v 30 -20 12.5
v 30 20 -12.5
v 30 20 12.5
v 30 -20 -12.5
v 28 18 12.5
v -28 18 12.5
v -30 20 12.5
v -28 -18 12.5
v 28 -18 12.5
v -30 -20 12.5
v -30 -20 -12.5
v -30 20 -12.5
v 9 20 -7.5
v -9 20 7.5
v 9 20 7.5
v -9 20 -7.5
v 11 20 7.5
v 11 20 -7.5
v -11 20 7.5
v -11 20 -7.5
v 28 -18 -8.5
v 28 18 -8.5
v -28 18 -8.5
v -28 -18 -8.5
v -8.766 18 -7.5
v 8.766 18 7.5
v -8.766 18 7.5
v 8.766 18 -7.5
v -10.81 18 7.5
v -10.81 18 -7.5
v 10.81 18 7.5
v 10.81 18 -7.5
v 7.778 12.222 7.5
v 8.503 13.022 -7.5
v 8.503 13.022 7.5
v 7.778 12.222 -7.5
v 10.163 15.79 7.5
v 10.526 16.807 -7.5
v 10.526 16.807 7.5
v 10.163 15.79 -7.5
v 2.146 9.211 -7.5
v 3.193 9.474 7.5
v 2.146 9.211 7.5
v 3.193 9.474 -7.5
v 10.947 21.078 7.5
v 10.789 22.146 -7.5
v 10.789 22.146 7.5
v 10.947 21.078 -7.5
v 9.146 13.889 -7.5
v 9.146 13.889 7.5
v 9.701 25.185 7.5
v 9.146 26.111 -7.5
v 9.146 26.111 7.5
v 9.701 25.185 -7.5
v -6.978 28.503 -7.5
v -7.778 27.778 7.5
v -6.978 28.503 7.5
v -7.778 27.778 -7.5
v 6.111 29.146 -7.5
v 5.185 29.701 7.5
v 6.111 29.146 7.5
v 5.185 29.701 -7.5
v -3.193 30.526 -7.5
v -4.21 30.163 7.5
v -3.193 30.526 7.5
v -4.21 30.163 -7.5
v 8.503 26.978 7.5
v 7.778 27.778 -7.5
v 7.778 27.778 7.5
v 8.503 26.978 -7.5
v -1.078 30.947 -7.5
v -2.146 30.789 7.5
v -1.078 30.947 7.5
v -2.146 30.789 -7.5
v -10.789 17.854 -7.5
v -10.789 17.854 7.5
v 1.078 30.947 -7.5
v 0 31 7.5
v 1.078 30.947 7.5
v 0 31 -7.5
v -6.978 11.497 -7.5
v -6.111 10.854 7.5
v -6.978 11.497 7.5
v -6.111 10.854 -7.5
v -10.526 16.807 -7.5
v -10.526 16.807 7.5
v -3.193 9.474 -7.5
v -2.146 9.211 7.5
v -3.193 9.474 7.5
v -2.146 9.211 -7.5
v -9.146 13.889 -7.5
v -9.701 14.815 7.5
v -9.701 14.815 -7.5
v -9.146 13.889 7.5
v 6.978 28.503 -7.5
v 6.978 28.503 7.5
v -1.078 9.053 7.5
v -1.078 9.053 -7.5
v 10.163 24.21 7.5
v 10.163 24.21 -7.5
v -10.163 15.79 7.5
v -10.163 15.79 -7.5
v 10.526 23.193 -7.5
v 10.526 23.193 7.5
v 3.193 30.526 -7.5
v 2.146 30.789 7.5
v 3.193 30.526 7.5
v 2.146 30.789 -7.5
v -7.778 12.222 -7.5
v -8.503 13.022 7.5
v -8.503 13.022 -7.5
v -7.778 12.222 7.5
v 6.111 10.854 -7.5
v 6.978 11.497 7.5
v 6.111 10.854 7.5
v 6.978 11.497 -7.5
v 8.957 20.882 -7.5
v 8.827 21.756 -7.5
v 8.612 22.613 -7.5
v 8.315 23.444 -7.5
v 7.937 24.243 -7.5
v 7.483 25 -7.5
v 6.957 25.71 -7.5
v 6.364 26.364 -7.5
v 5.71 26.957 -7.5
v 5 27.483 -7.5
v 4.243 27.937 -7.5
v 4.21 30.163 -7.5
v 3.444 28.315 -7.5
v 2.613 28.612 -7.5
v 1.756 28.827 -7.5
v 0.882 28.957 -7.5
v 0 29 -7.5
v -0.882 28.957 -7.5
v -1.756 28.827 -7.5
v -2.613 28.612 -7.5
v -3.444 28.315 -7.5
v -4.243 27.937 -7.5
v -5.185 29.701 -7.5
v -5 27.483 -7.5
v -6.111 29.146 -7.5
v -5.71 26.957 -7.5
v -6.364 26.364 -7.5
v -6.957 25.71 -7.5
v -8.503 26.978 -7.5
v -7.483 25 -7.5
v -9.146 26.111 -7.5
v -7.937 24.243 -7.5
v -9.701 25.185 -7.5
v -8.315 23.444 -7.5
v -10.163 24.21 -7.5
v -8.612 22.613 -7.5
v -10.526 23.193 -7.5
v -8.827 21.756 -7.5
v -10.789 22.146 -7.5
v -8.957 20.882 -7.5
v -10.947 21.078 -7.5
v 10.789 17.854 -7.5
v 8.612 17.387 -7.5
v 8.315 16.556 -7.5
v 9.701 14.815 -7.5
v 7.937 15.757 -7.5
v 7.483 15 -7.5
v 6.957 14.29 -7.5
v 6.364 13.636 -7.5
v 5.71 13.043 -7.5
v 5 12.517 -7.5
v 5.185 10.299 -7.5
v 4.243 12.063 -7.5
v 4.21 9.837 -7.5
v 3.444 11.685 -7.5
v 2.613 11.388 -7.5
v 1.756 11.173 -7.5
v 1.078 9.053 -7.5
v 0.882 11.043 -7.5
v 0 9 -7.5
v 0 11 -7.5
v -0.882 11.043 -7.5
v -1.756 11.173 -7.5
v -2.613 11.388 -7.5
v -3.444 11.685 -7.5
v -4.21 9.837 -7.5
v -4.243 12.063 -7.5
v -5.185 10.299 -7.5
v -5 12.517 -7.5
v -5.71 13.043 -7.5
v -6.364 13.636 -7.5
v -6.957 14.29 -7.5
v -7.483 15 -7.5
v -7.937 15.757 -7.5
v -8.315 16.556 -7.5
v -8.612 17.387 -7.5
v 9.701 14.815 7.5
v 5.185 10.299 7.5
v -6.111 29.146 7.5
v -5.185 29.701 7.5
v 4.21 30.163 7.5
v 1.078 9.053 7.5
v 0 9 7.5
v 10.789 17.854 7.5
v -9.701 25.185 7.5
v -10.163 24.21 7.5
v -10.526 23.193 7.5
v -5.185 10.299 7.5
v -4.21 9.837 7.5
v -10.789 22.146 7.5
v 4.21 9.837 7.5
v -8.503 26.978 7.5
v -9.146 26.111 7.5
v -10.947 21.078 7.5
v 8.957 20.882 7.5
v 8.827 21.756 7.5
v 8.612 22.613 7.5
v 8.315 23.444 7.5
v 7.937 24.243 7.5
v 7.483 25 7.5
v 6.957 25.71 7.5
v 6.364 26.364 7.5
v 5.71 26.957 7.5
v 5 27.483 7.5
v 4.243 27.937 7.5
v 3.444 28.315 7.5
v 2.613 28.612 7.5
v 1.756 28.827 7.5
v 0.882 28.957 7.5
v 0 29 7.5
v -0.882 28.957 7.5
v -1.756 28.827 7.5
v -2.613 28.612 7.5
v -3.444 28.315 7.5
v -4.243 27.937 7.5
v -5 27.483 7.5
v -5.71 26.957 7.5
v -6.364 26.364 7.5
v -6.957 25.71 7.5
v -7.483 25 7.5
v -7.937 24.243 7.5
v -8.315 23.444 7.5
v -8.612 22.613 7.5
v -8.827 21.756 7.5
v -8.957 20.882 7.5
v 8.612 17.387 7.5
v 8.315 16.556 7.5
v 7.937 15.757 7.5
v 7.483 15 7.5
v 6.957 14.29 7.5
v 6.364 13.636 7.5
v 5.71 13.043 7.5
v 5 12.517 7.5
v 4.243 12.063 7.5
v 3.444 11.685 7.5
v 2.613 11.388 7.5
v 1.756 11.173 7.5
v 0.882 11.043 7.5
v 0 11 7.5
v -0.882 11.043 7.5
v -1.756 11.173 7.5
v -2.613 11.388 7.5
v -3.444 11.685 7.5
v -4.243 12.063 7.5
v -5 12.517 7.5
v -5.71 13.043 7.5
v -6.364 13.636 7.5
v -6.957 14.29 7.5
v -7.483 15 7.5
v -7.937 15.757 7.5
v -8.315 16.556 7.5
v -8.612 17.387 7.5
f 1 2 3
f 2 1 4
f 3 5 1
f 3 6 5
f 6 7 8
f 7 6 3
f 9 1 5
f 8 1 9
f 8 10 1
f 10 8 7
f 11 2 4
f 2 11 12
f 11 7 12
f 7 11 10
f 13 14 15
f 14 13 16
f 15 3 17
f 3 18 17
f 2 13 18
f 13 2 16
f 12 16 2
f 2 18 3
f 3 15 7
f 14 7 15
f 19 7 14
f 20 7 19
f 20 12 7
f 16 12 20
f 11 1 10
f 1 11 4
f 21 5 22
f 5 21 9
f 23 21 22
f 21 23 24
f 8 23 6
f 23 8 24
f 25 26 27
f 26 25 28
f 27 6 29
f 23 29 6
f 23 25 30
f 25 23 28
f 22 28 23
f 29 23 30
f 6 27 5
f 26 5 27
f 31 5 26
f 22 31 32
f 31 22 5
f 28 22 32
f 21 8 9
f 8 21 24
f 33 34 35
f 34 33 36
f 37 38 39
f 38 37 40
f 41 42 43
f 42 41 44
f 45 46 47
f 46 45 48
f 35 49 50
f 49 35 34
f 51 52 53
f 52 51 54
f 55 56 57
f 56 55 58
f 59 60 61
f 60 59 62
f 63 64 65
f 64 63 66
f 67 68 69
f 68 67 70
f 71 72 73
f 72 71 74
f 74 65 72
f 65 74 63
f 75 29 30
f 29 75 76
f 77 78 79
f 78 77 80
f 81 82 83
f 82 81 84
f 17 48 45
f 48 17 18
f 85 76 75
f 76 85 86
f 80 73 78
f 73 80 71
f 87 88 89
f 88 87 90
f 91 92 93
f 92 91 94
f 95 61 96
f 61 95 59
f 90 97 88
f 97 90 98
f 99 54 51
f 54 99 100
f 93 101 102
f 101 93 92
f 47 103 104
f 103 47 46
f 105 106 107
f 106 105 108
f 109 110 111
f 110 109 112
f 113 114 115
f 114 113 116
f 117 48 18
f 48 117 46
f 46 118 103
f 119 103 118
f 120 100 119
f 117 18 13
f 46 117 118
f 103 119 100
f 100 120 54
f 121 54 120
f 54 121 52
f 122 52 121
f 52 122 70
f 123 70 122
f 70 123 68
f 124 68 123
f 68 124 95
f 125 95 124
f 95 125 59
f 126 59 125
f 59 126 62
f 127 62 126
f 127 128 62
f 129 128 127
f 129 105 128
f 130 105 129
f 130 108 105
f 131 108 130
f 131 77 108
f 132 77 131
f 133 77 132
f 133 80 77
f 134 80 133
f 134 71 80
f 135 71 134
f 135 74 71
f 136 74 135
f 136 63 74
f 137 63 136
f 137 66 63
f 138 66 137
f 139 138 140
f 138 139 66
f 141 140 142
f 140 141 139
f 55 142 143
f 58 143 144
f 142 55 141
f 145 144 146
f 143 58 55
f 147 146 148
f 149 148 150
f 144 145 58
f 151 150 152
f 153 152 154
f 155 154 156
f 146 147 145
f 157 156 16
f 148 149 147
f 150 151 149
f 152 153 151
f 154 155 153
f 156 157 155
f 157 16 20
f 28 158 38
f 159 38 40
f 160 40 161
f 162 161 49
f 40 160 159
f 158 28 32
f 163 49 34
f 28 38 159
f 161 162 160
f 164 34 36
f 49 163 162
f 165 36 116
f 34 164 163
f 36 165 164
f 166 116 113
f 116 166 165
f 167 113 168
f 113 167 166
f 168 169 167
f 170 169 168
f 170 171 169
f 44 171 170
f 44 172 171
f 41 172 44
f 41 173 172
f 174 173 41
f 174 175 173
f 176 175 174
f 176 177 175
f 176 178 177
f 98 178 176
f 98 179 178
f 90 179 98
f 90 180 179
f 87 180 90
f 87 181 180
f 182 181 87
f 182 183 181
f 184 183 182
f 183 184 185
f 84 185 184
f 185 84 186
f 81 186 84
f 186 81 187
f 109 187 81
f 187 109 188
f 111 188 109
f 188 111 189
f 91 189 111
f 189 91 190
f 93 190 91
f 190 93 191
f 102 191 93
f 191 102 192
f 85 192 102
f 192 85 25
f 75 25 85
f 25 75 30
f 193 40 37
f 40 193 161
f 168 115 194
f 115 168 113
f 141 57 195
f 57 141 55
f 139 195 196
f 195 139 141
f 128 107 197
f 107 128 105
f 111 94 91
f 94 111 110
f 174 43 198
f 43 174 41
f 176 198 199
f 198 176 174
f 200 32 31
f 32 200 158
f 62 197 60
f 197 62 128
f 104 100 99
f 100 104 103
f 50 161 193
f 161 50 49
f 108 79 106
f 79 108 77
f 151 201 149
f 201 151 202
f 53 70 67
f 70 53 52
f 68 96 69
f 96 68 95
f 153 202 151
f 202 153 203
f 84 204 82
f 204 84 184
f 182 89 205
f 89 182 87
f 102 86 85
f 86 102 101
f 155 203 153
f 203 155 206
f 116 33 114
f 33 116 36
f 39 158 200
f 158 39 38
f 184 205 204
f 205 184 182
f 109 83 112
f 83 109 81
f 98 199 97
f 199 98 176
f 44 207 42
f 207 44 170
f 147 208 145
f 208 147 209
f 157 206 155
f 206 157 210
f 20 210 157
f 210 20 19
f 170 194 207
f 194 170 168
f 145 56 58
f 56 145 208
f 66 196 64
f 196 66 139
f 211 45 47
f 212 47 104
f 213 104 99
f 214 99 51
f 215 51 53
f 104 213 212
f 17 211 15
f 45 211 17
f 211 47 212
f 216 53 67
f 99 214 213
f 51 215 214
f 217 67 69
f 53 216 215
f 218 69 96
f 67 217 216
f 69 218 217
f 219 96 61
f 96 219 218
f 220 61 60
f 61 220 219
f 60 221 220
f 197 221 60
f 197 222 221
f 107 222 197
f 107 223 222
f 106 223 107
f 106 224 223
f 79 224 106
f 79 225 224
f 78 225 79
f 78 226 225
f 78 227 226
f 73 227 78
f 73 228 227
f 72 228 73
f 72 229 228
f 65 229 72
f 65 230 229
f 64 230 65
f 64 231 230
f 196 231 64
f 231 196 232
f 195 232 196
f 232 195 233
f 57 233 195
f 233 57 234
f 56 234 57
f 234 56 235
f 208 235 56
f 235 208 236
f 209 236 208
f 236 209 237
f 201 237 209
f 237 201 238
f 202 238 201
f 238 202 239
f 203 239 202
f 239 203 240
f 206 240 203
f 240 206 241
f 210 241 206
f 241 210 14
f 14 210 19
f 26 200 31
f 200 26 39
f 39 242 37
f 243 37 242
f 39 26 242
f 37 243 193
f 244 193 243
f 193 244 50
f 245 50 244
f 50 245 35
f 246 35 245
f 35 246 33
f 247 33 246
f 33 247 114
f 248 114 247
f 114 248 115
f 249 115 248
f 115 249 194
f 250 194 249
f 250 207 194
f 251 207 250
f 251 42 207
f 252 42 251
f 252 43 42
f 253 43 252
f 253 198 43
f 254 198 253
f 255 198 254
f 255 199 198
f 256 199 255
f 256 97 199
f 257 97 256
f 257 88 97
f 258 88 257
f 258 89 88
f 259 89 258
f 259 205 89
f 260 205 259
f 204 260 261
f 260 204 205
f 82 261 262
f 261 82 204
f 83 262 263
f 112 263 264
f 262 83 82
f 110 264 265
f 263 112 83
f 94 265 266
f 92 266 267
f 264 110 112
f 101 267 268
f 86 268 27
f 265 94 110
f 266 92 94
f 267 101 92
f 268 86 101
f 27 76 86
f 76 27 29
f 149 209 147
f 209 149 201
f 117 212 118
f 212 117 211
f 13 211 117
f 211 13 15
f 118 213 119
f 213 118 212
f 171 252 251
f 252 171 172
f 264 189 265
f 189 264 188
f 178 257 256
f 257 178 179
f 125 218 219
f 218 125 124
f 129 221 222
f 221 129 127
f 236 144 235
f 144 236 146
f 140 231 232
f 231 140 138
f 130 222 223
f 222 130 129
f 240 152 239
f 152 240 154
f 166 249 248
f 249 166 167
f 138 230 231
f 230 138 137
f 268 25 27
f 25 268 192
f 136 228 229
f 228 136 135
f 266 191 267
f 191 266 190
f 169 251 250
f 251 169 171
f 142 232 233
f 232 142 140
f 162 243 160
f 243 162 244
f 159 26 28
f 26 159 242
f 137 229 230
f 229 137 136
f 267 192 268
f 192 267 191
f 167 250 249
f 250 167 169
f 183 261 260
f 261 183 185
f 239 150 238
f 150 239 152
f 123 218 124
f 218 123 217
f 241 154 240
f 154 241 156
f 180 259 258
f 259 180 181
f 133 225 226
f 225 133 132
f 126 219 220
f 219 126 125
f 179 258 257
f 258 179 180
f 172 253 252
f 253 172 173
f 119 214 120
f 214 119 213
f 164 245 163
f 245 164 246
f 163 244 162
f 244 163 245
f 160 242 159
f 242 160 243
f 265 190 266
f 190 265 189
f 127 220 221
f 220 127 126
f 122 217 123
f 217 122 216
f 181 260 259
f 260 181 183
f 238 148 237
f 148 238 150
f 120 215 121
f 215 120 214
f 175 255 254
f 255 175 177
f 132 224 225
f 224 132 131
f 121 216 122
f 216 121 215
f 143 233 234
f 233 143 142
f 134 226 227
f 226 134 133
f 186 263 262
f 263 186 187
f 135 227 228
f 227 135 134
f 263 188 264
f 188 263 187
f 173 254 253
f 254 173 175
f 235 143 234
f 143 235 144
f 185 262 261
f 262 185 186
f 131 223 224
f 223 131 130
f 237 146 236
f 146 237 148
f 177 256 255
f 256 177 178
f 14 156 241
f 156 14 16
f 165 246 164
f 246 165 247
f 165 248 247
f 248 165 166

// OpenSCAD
// ТеплоВид-4 — Тепловизионный модуль
$fn = 64;
module main_body() {
    difference() {
        cube([60,40,25], center=true);
        translate([0,0,2]) cube([56,36,21], center=true);
    }
}
module lens_housing() {
    color([0.3,0.3,0.3])
    difference() {
        cylinder(d=22, h=15, center=true);
        cylinder(d=18, h=16, center=true);
    }
}
module assembly() {
    main_body();
    translate([0,20,0]) lens_housing();
}
assembly();
